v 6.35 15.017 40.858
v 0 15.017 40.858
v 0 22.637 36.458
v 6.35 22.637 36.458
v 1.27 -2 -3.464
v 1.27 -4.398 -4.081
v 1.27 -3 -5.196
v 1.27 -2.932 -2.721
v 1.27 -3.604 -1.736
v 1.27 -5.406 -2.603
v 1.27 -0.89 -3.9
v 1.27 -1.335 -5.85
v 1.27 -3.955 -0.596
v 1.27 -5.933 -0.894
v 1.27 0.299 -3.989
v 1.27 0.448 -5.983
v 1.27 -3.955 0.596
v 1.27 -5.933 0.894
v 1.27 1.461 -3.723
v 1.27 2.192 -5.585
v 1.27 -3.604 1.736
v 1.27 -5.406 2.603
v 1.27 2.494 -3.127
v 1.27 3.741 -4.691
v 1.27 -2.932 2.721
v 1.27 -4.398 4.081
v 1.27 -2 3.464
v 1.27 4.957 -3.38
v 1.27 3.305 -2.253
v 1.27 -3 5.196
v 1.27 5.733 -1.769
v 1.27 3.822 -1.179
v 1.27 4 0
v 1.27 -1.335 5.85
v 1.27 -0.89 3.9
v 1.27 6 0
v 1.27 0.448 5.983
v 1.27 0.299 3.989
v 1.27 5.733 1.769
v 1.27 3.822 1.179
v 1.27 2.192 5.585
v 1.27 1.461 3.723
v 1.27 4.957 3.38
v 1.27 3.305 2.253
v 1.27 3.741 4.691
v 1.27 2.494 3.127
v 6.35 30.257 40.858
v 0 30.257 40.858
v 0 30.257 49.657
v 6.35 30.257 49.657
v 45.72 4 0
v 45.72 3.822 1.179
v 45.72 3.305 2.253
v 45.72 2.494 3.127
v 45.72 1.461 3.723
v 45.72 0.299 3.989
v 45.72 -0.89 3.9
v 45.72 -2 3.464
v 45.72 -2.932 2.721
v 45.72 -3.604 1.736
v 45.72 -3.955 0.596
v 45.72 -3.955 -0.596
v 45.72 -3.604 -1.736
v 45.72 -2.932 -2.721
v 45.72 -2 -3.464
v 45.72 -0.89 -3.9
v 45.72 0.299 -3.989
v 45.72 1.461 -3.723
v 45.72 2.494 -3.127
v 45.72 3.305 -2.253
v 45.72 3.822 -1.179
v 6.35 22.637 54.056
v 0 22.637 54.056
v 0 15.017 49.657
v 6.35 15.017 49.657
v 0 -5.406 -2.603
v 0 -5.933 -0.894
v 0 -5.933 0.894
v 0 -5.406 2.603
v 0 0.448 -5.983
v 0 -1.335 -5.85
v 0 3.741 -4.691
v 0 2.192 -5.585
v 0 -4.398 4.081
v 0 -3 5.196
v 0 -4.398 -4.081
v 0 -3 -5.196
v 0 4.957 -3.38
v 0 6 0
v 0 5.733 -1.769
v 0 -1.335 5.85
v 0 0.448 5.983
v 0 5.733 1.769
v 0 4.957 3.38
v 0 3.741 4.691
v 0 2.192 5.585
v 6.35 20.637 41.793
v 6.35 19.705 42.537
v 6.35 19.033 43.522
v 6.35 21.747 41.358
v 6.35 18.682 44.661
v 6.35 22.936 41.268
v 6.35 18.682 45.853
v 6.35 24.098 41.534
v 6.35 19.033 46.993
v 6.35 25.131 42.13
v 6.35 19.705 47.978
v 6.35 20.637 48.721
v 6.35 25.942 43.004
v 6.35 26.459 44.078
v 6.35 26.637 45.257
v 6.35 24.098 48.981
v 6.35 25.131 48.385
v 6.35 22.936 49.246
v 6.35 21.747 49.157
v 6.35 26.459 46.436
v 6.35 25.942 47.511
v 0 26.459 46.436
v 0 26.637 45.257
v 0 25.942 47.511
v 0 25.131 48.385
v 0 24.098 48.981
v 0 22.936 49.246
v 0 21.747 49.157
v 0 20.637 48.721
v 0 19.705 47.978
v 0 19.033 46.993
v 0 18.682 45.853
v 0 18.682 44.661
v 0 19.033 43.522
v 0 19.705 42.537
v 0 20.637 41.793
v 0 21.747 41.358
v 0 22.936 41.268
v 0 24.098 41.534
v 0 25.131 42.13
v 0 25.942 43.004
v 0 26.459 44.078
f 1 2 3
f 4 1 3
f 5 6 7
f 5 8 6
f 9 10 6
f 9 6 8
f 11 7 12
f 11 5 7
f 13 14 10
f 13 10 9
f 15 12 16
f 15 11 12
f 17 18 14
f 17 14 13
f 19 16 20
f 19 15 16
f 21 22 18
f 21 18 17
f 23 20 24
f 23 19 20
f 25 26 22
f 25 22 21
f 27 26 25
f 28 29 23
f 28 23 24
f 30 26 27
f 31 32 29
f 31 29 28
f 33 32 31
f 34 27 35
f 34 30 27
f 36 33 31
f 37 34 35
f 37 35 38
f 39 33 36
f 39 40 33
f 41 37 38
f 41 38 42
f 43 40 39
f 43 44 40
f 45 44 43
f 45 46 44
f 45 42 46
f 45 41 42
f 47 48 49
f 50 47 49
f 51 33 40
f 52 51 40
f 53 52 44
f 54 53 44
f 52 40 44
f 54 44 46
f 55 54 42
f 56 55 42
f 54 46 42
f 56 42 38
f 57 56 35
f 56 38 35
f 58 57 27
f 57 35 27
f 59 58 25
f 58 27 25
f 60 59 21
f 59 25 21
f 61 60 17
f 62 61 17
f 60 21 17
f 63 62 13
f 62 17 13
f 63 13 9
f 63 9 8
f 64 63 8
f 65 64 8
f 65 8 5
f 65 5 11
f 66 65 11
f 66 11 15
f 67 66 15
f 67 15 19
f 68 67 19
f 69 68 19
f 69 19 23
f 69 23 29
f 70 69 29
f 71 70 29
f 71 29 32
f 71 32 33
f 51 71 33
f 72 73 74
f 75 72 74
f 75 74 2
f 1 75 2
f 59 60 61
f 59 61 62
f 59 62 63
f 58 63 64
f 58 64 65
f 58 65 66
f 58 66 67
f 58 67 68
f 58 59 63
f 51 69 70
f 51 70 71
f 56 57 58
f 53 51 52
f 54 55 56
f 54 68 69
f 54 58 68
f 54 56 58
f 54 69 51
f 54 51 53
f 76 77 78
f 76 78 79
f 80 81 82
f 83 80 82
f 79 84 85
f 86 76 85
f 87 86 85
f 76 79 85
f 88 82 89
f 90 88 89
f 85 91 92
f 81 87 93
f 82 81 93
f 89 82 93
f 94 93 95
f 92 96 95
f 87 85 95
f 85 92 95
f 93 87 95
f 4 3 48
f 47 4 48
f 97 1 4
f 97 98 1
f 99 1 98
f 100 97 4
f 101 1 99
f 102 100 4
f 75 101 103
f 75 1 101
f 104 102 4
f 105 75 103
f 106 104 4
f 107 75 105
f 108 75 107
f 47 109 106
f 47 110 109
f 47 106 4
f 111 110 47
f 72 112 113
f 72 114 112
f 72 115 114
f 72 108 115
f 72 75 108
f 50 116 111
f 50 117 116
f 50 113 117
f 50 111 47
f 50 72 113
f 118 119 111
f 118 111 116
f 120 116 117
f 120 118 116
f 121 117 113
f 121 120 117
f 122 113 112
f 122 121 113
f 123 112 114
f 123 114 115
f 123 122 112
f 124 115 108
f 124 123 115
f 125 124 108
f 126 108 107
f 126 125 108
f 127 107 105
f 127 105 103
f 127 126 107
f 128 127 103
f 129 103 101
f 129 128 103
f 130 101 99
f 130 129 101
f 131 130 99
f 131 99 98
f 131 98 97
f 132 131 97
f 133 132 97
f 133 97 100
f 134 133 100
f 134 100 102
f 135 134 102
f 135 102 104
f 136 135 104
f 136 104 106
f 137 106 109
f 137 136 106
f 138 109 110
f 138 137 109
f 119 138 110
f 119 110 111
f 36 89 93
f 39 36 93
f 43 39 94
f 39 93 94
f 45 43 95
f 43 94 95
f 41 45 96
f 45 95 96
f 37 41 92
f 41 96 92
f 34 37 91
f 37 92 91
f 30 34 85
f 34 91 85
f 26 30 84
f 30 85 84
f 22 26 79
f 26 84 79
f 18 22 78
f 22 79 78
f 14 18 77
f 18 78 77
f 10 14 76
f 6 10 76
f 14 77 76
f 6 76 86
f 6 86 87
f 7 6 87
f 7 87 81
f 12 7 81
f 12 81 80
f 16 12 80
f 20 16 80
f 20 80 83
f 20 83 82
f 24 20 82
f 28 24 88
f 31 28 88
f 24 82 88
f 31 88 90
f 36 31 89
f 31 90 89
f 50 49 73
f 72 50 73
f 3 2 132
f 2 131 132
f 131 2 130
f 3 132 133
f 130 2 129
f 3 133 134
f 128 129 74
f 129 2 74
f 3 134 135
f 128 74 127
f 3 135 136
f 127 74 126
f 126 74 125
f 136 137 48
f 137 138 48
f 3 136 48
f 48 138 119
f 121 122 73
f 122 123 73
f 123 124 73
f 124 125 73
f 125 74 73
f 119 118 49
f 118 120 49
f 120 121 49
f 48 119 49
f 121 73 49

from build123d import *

# Parameters (mm, degrees)
F0_R     = 4
F1_DEPTH = 45.72
F0_R_2   = 6
F2_DEPTH = 1.27
F3_R     = 4
F4_DEPTH = 6.35


with BuildPart() as f1:
    # F0 (on Right) → F1 (new body)
    with BuildSketch(Plane.YZ):
        Circle(F0_R)
    extrude(amount=F1_DEPTH)

    # F0 (on Right) → F2 (join)
    with BuildSketch(Plane.YZ):
        Circle(F0_R_2)
        Circle(F0_R, mode=Mode.SUBTRACT)
    extrude(amount=F2_DEPTH)


with BuildPart() as f4:
    # F3 (on Right) → F4 (new body)
    with BuildSketch(Plane.YZ):
        Polygon((30.256976, 40.85782), (30.256976, 49.656638), (22.636976, 54.056047), (15.016976, 49.656638), (15.016976, 40.85782), (22.636976, 36.458411), align=None)
        with Locations((22.636976, 45.257229)):
            Circle(F3_R, mode=Mode.SUBTRACT)
    extrude(amount=F4_DEPTH)


solid = Compound([f1.part, f4.part])
